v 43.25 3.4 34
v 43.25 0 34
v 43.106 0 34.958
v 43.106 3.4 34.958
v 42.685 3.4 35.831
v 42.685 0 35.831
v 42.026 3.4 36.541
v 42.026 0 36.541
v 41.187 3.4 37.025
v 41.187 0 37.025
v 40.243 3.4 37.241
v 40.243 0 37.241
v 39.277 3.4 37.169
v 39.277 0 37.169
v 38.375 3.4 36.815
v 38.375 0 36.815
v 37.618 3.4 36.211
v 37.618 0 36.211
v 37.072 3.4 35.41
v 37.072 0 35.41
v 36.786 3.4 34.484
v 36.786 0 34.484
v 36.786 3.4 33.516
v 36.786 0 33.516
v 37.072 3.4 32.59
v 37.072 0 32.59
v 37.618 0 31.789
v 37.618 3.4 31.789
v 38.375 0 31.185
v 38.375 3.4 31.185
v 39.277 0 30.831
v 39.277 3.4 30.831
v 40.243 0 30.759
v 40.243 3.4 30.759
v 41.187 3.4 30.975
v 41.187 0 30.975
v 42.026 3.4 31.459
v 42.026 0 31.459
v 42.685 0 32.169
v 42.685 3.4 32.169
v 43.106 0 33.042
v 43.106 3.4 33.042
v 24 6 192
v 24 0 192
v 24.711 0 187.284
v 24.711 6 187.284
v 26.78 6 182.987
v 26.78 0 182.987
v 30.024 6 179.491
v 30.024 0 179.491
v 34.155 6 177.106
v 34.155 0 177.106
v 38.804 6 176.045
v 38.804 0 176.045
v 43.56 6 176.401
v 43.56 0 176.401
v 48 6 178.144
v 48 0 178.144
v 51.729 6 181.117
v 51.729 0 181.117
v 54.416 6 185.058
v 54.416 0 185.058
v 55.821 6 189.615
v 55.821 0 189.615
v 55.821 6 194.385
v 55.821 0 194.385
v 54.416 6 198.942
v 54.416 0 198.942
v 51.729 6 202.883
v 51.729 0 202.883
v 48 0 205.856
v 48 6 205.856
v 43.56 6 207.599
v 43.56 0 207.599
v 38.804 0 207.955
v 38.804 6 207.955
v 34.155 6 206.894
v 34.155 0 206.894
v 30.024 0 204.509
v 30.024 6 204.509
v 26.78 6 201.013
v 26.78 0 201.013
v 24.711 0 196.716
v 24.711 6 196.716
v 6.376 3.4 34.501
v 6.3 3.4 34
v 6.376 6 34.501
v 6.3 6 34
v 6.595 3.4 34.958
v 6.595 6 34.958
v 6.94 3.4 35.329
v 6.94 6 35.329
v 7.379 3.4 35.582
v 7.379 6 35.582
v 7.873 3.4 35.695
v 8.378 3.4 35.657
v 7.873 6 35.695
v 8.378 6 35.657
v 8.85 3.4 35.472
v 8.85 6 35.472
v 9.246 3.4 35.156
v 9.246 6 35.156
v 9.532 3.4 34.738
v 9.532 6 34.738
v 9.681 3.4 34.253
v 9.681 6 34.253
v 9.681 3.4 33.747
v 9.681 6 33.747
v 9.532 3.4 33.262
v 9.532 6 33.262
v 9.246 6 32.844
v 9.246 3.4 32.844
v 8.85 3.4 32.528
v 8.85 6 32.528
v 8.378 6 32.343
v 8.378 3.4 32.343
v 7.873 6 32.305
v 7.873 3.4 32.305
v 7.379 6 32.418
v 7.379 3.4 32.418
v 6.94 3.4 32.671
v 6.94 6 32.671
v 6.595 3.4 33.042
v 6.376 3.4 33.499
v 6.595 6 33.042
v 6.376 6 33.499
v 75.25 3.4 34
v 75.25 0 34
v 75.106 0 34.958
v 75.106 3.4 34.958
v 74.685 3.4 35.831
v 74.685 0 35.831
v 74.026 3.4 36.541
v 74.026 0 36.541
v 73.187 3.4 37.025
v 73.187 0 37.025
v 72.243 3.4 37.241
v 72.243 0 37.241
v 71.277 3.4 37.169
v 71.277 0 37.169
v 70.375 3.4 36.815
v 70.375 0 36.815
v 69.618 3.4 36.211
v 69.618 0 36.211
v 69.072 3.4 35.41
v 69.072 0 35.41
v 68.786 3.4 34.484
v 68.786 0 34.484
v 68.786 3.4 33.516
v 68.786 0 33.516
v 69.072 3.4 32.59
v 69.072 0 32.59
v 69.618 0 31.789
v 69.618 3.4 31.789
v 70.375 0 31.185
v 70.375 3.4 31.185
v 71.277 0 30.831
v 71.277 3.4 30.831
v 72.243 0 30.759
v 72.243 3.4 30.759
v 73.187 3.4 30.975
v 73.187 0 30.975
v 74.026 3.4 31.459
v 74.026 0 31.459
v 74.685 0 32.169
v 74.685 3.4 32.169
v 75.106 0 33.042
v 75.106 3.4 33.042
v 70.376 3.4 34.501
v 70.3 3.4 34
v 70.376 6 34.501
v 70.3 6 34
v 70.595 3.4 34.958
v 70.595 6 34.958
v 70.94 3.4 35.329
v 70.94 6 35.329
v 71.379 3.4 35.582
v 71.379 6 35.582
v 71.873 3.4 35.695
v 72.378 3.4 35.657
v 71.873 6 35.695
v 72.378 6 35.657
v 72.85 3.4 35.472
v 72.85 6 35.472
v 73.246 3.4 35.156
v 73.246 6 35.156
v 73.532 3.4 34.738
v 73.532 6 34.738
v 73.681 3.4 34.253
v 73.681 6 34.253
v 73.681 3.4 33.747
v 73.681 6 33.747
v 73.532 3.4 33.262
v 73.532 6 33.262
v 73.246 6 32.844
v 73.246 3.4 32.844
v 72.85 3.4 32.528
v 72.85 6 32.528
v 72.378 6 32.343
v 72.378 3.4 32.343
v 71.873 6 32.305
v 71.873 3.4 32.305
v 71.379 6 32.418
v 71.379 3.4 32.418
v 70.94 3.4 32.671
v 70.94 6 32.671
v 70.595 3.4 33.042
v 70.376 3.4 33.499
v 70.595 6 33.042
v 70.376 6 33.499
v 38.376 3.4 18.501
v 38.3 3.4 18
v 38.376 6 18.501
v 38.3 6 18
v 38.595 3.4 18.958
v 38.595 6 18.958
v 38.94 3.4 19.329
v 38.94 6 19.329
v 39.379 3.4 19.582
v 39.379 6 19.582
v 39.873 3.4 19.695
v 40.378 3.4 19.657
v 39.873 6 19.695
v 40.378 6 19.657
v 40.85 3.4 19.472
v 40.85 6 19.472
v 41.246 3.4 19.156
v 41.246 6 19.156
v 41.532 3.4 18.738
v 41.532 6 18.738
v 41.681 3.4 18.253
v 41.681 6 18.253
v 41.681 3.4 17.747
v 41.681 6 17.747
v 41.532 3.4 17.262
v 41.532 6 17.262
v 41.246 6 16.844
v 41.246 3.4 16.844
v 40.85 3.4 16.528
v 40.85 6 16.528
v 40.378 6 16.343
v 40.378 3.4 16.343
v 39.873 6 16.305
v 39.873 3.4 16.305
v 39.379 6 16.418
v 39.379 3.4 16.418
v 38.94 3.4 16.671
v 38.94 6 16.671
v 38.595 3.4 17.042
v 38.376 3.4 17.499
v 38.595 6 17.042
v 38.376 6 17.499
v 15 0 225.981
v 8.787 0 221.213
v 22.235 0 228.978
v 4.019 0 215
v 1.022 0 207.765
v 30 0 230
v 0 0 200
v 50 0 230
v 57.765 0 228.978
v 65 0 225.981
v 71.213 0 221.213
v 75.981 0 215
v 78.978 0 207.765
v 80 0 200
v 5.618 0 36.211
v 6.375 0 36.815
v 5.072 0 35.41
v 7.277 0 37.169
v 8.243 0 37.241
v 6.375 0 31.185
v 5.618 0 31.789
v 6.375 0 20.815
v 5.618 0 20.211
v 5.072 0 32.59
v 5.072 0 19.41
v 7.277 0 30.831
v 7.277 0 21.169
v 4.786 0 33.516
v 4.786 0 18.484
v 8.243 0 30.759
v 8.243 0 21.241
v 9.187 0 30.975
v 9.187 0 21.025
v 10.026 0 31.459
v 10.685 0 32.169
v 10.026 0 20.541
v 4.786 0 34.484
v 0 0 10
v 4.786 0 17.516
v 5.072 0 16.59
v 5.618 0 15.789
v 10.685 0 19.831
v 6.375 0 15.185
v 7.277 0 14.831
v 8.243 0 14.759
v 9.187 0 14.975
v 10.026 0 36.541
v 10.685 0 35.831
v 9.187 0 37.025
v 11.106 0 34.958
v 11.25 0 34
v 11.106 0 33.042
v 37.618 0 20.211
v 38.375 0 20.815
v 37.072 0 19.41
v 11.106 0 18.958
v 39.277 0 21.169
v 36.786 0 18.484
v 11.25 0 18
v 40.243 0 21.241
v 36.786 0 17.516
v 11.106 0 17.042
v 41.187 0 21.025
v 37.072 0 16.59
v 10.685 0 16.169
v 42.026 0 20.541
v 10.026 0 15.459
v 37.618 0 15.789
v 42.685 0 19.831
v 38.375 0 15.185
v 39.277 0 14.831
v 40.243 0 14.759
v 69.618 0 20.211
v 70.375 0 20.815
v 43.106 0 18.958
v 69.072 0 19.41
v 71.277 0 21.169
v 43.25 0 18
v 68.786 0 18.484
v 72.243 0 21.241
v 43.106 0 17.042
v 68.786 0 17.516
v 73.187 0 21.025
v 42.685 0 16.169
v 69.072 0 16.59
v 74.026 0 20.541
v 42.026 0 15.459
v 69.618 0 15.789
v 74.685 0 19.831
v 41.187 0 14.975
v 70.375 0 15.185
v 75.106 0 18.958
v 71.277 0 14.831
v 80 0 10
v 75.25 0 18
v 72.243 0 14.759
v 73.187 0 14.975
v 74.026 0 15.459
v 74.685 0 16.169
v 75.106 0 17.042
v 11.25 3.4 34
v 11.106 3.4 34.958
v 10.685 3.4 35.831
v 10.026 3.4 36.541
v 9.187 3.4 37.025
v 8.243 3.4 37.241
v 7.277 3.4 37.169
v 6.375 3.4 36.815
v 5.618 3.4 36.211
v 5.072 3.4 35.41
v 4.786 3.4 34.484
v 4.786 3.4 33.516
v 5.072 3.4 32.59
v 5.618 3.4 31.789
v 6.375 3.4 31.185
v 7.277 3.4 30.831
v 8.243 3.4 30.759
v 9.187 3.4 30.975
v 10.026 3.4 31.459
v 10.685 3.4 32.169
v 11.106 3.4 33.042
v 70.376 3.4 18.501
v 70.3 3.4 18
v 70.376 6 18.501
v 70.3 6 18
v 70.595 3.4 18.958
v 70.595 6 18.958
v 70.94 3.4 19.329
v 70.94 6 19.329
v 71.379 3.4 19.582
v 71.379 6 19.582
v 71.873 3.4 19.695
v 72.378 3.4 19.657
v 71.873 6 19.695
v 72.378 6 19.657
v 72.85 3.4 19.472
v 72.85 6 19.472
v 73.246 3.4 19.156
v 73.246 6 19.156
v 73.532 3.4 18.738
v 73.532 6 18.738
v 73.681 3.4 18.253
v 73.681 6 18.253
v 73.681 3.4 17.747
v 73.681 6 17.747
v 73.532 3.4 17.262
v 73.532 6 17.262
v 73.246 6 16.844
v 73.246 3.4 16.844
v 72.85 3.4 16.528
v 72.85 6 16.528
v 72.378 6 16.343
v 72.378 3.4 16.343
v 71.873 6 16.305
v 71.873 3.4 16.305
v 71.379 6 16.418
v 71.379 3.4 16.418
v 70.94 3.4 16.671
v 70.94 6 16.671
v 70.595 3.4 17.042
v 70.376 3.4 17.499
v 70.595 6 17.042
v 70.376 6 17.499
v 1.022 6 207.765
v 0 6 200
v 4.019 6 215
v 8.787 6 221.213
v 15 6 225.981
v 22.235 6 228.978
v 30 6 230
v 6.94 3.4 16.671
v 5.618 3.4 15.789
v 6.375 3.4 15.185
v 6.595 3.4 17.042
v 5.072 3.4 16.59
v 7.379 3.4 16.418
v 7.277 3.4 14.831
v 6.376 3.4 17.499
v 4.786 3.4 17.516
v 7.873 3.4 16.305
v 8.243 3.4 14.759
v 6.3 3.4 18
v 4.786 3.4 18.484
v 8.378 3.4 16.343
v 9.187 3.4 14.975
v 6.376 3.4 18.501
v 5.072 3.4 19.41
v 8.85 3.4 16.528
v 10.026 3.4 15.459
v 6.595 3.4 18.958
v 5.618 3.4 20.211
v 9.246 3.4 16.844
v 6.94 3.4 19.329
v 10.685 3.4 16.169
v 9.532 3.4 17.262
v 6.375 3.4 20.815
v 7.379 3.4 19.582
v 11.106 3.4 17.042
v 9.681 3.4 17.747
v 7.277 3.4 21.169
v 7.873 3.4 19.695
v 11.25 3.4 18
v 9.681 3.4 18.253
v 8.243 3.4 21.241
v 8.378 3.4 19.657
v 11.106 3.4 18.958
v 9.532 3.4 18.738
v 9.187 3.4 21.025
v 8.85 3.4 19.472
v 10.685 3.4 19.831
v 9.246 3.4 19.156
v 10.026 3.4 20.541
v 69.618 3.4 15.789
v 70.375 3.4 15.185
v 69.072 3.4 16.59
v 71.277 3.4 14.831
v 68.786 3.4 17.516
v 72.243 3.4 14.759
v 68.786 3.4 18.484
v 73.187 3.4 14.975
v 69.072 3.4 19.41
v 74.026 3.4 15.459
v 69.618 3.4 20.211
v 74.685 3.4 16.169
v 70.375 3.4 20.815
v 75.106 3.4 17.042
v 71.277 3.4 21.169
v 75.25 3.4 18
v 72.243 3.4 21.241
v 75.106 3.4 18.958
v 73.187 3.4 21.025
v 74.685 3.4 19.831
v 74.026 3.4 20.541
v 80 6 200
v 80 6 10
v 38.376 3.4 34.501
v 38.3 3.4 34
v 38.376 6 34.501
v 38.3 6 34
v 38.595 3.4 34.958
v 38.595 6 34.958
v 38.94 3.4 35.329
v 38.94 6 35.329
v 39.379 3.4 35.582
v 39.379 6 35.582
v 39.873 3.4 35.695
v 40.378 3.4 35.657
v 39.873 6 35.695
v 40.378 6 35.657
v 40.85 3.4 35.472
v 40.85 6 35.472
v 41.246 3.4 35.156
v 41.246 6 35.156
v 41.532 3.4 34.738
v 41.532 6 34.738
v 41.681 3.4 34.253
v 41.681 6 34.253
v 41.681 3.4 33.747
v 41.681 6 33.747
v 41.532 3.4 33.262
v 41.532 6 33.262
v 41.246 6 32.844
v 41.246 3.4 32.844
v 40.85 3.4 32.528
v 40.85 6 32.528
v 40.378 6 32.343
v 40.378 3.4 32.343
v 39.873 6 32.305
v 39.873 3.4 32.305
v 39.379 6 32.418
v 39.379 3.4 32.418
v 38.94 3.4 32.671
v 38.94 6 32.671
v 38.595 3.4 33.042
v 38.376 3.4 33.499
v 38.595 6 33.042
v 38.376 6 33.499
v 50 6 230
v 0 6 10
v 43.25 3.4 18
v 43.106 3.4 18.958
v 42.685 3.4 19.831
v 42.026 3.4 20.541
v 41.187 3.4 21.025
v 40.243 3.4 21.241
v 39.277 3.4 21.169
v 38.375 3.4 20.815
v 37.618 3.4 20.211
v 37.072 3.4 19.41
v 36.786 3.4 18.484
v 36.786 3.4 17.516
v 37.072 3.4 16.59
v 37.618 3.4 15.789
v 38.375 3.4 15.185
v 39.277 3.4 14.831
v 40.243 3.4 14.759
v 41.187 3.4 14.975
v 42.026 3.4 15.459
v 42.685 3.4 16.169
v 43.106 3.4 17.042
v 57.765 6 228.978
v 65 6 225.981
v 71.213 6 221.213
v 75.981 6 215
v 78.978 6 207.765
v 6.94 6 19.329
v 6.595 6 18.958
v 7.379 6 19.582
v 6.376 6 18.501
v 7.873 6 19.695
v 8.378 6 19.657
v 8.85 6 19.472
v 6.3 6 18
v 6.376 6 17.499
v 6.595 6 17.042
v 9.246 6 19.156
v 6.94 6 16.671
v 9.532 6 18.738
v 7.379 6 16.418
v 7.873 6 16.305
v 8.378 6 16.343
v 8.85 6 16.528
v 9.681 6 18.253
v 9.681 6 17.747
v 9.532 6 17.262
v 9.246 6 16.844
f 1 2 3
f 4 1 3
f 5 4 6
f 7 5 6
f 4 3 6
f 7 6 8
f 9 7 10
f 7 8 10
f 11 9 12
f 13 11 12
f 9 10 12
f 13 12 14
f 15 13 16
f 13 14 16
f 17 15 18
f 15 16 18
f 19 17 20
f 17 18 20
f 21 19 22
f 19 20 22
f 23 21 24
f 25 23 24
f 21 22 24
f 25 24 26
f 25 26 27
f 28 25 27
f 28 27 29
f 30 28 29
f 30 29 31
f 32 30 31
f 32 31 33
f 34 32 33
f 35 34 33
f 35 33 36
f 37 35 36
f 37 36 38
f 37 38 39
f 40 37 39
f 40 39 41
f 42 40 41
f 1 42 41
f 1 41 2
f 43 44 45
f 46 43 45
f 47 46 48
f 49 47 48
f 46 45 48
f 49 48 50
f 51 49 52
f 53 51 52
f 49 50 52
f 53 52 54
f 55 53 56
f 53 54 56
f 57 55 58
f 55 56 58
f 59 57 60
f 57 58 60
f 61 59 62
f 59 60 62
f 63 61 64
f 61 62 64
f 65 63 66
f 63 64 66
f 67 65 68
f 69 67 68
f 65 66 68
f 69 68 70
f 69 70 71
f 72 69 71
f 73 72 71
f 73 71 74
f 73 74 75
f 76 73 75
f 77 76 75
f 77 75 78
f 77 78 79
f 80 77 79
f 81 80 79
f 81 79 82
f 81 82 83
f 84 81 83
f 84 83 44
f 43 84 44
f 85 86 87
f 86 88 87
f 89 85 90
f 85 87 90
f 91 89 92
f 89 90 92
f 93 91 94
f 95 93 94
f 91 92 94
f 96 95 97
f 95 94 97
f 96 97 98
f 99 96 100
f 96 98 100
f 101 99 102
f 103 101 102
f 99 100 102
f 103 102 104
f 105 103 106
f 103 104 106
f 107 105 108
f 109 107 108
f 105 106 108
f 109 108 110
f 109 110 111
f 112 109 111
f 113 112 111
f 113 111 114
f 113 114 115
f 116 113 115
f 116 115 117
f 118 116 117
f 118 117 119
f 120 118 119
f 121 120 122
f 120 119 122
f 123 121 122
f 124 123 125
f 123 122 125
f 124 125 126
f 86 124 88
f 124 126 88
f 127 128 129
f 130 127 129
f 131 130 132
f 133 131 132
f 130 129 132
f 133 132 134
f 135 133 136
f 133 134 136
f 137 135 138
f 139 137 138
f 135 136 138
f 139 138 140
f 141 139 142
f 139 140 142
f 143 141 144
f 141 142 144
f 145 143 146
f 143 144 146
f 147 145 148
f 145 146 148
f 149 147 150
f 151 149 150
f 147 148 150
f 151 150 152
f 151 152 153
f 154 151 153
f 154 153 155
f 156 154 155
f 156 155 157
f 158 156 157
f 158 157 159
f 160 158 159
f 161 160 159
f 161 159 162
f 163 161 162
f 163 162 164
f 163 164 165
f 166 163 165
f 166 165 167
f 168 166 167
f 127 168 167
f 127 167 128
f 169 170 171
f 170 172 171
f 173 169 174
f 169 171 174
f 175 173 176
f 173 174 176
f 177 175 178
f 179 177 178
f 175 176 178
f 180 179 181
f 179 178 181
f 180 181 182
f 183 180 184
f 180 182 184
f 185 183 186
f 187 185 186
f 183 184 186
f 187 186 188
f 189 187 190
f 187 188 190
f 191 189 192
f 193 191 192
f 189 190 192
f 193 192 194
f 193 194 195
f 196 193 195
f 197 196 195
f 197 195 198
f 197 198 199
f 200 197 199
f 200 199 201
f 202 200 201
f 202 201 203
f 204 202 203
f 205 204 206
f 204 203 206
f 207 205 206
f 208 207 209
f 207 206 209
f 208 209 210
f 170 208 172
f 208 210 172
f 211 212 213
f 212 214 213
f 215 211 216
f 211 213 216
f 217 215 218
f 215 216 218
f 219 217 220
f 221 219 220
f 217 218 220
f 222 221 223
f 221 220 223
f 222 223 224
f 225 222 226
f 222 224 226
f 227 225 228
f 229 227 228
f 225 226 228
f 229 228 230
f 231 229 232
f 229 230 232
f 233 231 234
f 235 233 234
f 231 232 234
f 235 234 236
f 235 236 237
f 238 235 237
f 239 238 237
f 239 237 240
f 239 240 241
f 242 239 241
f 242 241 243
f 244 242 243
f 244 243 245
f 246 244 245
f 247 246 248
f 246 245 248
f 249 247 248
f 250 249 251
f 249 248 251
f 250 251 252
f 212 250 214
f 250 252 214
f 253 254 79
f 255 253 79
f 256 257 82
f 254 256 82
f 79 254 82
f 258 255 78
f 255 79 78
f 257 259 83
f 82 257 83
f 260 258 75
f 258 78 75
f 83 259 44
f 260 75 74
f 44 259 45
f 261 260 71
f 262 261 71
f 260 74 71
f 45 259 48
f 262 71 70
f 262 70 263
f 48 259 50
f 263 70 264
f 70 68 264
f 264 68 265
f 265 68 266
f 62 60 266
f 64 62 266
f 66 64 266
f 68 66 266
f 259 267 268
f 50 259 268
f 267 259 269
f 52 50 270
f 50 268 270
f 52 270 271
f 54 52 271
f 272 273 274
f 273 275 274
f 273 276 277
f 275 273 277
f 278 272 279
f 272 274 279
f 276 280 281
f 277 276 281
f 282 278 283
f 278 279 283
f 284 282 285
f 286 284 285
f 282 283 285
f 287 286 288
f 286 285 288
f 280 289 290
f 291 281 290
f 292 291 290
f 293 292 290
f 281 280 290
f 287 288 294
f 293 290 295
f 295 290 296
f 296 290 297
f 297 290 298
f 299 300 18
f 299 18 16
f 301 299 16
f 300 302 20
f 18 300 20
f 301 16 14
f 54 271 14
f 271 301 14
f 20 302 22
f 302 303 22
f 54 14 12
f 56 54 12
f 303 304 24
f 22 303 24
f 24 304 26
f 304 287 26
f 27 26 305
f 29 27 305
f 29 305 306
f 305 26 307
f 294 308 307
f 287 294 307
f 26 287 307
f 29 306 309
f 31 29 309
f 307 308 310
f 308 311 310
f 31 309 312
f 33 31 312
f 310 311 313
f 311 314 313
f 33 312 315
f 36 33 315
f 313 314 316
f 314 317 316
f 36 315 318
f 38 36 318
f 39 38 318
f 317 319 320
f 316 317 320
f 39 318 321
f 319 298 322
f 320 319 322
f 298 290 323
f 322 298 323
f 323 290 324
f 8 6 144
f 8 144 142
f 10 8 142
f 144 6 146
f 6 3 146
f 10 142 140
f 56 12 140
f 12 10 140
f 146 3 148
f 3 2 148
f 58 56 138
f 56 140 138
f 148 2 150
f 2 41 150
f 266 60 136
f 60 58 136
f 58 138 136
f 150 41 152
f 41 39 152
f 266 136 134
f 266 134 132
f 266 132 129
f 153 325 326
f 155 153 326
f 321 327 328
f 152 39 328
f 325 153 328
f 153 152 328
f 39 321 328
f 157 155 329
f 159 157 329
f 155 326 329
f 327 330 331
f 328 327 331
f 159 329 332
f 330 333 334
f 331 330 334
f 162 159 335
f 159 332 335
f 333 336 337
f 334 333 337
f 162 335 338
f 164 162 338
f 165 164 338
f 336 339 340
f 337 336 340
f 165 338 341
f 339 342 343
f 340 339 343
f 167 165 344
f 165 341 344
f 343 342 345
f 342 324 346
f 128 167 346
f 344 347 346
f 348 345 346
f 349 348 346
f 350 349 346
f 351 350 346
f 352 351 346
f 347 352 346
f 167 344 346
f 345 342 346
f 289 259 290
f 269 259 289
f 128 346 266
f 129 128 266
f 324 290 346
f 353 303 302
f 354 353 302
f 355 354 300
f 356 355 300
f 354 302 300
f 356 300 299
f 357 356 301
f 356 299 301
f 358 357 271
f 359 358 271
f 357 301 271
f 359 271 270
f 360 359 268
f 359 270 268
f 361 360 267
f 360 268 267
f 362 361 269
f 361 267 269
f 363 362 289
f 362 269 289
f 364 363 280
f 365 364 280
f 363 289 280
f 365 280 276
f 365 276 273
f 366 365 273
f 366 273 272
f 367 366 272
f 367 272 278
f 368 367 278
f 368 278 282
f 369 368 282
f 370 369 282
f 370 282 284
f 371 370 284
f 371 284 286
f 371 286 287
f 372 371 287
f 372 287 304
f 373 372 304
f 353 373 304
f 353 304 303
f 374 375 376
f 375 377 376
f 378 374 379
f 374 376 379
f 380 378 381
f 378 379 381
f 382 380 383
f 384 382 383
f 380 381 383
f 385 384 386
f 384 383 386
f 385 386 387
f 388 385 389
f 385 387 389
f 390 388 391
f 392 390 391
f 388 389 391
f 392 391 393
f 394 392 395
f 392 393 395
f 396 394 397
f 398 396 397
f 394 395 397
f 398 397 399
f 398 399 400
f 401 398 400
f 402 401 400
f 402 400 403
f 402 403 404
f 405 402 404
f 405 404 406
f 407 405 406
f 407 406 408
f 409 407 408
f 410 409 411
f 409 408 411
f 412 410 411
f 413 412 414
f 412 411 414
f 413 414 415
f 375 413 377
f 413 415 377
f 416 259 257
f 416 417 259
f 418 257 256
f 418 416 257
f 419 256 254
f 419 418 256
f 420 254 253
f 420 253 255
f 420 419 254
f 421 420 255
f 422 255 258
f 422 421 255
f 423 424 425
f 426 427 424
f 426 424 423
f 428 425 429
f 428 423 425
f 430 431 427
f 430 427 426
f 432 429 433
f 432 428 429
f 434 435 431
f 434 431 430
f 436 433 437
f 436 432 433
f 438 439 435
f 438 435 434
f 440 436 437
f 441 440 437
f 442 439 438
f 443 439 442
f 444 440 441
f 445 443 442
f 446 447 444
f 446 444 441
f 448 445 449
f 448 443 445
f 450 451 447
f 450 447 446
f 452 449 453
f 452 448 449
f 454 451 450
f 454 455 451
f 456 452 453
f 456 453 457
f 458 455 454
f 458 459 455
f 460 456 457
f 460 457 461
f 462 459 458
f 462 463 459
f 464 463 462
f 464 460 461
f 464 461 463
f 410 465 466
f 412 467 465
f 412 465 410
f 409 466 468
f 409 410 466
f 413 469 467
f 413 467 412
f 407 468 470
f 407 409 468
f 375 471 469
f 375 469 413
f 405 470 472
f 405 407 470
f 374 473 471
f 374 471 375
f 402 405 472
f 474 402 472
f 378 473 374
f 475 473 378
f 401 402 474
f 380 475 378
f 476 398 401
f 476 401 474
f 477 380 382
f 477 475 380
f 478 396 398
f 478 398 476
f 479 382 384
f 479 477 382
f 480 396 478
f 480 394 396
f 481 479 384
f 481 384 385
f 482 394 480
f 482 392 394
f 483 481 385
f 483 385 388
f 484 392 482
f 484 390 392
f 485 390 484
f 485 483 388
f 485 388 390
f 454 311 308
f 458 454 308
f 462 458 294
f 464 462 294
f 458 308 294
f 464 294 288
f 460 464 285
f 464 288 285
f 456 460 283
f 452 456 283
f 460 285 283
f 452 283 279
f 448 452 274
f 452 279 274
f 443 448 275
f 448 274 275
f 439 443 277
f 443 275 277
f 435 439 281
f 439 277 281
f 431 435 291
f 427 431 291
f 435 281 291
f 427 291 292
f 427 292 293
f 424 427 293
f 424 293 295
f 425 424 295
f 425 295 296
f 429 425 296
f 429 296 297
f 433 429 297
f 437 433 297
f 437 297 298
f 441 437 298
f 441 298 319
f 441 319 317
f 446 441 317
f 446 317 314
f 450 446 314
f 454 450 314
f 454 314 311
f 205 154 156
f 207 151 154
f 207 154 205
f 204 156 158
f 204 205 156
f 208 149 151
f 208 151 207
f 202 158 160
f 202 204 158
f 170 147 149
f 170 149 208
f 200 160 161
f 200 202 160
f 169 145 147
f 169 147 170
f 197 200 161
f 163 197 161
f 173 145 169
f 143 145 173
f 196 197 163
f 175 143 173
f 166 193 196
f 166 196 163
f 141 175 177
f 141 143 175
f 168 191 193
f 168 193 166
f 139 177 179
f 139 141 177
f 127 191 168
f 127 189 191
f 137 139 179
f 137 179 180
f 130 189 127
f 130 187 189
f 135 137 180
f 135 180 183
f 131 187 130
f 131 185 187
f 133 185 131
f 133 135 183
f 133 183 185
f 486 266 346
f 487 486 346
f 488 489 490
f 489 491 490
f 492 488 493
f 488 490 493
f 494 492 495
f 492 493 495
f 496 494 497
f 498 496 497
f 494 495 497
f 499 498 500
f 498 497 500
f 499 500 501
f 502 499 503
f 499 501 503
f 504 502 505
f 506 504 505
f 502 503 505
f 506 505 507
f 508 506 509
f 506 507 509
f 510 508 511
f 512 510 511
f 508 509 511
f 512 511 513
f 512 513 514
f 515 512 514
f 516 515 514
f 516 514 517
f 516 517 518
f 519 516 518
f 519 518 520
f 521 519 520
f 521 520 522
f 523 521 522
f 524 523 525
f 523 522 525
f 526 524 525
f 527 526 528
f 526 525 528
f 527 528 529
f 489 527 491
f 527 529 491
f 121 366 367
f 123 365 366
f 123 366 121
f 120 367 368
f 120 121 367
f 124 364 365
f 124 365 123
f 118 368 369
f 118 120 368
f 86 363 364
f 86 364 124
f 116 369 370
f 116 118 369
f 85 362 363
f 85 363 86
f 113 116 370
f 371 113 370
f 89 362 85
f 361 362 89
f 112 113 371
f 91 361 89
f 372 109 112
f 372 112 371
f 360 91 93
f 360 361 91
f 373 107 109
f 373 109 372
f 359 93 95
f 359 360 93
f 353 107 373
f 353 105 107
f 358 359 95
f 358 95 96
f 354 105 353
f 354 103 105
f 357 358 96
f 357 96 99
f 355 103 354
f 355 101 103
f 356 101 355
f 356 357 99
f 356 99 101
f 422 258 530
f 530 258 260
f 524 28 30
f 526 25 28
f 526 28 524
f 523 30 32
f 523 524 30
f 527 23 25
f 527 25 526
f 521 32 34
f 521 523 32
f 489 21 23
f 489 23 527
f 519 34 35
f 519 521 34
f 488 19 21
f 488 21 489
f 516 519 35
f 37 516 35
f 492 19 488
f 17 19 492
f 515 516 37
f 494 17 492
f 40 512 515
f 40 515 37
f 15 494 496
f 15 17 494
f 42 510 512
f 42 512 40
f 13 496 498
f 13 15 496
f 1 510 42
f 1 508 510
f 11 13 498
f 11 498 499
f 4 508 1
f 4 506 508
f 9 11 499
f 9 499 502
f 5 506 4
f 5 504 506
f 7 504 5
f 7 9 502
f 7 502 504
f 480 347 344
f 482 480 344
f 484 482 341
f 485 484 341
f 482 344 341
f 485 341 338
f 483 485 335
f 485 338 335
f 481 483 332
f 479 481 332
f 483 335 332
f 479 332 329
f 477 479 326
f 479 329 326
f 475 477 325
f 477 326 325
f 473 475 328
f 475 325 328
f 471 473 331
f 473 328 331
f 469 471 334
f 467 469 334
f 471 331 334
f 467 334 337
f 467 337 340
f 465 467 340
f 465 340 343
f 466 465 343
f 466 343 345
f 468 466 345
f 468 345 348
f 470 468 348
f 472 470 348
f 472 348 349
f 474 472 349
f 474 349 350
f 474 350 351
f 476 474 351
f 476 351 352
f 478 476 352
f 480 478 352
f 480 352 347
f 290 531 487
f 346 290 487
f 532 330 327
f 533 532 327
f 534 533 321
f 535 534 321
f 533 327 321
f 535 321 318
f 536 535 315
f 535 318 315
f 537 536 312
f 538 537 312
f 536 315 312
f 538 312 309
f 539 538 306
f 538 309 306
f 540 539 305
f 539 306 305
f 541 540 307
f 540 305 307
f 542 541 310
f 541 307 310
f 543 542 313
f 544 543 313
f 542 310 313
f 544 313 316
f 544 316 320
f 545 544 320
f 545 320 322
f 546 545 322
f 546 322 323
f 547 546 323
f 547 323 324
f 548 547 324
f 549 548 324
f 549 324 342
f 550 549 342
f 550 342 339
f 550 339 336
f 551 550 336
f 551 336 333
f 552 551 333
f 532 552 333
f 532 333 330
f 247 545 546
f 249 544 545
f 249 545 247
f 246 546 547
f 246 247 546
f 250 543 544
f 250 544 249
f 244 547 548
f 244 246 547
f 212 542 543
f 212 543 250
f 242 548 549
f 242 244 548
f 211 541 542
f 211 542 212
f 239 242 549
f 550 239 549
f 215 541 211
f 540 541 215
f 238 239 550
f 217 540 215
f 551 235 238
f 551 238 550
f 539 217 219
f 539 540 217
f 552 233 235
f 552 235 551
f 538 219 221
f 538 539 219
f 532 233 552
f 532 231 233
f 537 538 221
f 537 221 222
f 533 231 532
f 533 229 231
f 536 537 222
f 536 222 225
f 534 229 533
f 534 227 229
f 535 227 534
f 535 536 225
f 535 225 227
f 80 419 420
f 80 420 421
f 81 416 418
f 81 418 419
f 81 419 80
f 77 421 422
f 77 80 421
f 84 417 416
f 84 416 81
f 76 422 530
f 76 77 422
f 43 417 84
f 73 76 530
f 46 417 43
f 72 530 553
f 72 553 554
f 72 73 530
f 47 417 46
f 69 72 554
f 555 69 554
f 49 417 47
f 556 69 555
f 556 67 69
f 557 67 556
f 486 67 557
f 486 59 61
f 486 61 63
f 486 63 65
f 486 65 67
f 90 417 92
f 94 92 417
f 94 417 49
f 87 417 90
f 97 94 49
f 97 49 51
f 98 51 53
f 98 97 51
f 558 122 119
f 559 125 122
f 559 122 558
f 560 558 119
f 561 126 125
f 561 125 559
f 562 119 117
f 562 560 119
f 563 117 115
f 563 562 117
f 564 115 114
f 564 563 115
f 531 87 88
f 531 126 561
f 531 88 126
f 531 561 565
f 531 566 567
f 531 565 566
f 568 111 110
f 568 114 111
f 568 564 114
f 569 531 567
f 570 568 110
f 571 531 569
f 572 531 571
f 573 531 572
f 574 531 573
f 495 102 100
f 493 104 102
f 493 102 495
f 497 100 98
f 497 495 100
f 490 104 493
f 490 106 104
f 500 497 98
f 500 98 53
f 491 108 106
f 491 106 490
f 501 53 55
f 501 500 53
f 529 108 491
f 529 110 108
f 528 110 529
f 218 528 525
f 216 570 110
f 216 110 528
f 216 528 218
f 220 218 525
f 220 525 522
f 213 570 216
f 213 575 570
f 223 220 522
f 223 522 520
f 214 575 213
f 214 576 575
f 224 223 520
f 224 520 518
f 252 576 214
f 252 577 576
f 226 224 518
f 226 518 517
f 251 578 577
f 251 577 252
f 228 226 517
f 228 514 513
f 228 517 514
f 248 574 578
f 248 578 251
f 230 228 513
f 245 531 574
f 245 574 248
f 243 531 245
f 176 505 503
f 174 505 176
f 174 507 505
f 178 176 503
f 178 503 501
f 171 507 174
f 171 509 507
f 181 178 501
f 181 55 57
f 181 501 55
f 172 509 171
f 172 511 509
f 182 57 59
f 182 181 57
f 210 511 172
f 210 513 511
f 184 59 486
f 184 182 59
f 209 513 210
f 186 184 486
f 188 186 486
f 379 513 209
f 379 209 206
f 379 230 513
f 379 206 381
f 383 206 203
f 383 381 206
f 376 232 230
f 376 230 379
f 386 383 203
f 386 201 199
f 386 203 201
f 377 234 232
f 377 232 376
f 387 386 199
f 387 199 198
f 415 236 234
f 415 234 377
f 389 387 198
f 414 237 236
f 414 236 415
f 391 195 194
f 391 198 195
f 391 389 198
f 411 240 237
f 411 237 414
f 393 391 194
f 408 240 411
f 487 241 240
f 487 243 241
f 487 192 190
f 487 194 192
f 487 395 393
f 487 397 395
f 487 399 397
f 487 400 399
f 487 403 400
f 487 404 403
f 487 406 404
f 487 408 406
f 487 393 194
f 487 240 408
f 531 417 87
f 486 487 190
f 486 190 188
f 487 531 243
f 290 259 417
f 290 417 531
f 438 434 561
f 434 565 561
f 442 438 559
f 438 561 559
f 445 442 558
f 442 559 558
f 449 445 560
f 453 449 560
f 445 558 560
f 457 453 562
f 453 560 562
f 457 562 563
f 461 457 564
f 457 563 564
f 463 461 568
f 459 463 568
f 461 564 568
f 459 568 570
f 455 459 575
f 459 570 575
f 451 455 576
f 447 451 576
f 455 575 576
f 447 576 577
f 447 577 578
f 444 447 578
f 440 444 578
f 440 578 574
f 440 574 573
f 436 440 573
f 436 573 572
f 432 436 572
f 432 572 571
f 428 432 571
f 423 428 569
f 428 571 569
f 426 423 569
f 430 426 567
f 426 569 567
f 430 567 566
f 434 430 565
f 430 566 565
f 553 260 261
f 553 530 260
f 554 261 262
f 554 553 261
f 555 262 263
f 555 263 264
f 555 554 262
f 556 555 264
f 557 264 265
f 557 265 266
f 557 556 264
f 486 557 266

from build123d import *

# Parameters (mm, degrees)
SKETCH1_W                                           = 80
SKETCH1_H                                           = 230
BOSS_EXTRUDE1_DEPTH                                 = 6
F_32_0_32_DIAMETER_HOLE1_D                          = 32
FILLET1_R                                           = 30
CBORE_FOR_M3_HEX_SOCKET_HEAD_CAP_SCREW1_D           = 3.4
CBORE_FOR_M3_HEX_SOCKET_HEAD_CAP_SCREW1_CBORE_D     = 6.5
CBORE_FOR_M3_HEX_SOCKET_HEAD_CAP_SCREW1_CBORE_DEPTH = 3.4
SKETCH10_W                                          = 80
SKETCH10_H                                          = 10
CUT_EXTRUDE1_DEPTH                                  = 244.589819163


with BuildPart() as part:
    # Sketch1 → Boss-Extrude1 (new body)
    with BuildSketch(Plane(origin=(0, 0, 0), x_dir=(1, 0, 0), z_dir=(0, 1, 0))):
        with Locations((40, -115)):
            Rectangle(SKETCH1_W, SKETCH1_H)
    extrude(amount=BOSS_EXTRUDE1_DEPTH)

    # Ø32.0 (32) Diameter Hole1 (through all)
    with Locations(Plane(origin=(0, 6, 0), x_dir=(1, 0, 0), z_dir=(0, 1, 0))):
        with Locations((40, -192)):
            Hole(F_32_0_32_DIAMETER_HOLE1_D / 2)

    # Fillet1
    fillet1_edges = [part.edges().sort_by_distance(p)[0] for p in [
        (80, 3, 230),
        (0, 3, 230),
    ]]
    fillet(fillet1_edges, radius=FILLET1_R)

    # CBORE for M3 Hex Socket Head Cap Screw1 (through all)
    with Locations(Plane.XZ):
        with Locations((8, 18), (40, 18), (72, 18), (40, 34), (72, 34), (8, 34)):
            CounterBoreHole(CBORE_FOR_M3_HEX_SOCKET_HEAD_CAP_SCREW1_D / 2, CBORE_FOR_M3_HEX_SOCKET_HEAD_CAP_SCREW1_CBORE_D / 2, CBORE_FOR_M3_HEX_SOCKET_HEAD_CAP_SCREW1_CBORE_DEPTH)

    # Sketch10 → Cut-Extrude1 (cut, through all)
    with BuildSketch(Plane(origin=(0, 6, 0), x_dir=(1, 0, 0), z_dir=(0, 1, 0))):
        with Locations((40, -5)):
            Rectangle(SKETCH10_W, SKETCH10_H)
    extrude(amount=-CUT_EXTRUDE1_DEPTH, mode=Mode.SUBTRACT)


solid = part.part
